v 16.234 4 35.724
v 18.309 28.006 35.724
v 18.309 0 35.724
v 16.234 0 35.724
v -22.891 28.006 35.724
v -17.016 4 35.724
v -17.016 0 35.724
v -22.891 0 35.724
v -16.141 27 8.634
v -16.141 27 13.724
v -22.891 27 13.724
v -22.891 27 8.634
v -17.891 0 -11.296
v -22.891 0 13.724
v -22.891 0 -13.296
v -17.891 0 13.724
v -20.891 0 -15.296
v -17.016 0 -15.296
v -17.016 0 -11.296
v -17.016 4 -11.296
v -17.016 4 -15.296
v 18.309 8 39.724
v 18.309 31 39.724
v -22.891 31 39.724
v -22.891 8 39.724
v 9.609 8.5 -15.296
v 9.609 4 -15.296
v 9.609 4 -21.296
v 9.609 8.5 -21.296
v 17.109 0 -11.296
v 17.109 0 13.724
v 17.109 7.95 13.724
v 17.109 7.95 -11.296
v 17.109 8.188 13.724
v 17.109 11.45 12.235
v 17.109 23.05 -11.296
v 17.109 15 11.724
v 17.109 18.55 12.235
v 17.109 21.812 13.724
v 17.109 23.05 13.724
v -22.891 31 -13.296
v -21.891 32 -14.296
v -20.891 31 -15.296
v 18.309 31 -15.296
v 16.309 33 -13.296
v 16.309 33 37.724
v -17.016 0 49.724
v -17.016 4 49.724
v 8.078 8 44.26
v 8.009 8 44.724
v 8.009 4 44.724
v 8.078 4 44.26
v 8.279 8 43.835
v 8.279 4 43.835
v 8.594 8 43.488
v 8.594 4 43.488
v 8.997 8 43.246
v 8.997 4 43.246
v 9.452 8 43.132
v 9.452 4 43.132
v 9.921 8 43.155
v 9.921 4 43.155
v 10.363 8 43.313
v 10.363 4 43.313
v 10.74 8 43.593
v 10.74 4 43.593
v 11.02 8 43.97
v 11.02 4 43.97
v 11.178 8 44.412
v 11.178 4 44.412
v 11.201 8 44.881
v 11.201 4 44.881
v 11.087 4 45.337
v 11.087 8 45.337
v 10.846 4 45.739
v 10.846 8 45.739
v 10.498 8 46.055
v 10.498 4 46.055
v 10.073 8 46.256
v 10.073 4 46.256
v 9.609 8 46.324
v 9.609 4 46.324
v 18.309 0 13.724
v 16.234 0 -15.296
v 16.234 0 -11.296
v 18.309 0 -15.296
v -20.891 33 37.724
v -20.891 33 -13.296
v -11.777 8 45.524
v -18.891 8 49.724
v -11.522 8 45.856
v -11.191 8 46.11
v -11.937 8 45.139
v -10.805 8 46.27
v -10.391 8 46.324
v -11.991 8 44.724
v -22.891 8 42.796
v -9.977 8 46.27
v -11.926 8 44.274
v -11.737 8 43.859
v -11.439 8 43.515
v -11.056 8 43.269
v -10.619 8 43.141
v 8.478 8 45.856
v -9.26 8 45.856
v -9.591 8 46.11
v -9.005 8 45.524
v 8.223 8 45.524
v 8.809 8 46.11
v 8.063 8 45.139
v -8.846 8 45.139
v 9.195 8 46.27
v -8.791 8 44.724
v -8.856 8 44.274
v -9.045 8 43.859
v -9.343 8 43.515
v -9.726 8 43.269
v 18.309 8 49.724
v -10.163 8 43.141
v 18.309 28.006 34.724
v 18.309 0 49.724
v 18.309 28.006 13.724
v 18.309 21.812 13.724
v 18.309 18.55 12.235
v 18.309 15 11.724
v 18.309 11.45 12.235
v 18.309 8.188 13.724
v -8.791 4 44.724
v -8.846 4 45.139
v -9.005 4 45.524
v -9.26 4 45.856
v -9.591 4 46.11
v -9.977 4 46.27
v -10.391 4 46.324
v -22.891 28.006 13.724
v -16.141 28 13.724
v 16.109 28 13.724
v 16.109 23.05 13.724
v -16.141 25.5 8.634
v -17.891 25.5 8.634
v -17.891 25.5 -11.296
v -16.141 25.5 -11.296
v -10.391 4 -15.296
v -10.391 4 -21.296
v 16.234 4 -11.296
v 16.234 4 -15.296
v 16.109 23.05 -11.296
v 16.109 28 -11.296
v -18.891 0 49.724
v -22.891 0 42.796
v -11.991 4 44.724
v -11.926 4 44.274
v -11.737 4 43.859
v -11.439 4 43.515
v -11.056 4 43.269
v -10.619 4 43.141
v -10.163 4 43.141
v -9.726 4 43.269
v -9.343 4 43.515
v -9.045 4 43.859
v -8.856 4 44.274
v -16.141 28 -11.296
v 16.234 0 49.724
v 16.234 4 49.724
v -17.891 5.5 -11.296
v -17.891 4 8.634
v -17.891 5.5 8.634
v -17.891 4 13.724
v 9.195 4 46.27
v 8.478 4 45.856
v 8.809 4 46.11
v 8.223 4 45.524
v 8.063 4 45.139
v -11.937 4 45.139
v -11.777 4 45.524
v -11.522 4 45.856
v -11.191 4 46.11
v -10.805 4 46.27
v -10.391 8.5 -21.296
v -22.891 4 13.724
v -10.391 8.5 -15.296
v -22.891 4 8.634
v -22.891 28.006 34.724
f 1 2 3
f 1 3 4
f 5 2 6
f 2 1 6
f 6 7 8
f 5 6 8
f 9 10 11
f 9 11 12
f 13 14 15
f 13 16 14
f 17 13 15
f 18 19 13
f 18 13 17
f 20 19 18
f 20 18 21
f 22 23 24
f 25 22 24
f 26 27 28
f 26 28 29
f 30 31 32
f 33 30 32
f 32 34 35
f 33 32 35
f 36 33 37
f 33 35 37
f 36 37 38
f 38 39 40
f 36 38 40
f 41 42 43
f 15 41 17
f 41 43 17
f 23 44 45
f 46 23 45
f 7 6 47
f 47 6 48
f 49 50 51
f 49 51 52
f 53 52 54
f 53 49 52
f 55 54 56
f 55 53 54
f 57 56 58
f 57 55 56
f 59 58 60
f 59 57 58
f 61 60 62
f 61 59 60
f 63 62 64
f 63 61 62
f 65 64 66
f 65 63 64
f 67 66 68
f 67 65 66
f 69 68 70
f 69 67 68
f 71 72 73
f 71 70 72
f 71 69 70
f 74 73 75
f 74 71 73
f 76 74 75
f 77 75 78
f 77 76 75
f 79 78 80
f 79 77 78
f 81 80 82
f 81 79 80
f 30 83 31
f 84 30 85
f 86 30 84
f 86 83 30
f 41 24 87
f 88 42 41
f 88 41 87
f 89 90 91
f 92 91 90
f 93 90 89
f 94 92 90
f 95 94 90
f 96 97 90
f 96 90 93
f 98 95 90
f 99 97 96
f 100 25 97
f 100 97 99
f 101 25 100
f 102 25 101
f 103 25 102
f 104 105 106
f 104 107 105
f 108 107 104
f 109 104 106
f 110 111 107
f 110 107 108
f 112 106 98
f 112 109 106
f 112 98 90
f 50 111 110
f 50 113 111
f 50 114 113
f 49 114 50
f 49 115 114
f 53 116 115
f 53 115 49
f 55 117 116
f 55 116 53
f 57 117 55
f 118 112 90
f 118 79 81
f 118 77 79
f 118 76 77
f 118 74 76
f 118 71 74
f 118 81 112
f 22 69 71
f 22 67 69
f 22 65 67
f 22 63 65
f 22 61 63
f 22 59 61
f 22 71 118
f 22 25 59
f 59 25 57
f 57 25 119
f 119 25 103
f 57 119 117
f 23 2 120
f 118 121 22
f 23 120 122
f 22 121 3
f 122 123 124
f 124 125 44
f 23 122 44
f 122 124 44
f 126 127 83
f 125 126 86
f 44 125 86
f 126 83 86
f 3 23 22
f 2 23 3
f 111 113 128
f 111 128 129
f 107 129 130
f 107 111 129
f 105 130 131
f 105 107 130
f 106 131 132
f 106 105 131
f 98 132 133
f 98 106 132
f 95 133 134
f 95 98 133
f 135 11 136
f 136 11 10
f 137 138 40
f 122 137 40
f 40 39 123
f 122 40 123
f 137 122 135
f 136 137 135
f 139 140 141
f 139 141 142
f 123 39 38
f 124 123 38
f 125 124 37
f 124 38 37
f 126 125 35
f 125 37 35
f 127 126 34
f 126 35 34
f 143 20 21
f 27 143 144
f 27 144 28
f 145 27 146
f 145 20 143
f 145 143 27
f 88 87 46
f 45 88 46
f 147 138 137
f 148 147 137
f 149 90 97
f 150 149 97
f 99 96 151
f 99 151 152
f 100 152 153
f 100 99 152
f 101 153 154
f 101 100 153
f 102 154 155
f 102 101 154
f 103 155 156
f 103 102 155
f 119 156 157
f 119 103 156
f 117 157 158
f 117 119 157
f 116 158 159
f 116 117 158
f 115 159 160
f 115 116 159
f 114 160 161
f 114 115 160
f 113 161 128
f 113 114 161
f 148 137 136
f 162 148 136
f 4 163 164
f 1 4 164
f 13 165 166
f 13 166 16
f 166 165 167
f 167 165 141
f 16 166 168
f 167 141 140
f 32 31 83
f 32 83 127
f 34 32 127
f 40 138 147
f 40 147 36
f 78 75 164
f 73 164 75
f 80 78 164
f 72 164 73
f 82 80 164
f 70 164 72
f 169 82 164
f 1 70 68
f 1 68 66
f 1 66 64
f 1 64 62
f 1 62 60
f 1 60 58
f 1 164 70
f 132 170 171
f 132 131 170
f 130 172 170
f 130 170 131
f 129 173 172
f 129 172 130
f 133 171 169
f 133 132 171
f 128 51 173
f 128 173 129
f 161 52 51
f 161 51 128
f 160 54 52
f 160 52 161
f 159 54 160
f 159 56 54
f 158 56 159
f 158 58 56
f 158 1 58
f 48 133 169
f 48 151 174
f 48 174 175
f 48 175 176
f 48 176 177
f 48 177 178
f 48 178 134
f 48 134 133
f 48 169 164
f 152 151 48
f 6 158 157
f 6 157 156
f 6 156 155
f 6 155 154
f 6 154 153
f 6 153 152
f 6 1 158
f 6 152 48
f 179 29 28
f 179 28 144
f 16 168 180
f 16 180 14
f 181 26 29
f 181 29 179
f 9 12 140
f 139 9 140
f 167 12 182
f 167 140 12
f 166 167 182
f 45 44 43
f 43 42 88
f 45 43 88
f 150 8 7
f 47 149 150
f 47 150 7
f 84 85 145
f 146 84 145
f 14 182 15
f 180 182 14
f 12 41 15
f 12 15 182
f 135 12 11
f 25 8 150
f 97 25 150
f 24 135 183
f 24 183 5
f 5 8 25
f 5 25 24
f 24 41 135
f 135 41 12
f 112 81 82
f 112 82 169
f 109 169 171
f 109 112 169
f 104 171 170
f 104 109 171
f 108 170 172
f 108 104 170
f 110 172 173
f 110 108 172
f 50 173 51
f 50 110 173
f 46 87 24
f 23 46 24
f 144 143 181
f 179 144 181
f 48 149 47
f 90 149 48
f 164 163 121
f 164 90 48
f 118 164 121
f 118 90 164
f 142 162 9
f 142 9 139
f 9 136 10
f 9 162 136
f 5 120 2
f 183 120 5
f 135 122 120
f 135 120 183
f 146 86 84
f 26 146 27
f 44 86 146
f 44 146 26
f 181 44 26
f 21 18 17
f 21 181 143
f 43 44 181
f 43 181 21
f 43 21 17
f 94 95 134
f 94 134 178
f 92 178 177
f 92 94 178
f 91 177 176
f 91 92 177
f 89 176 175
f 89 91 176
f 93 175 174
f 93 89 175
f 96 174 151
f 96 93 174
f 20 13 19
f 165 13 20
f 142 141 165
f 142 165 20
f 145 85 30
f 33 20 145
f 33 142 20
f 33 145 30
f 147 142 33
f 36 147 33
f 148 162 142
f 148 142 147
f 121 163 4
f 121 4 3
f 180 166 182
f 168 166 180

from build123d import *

# Parameters (mm, degrees)
SKETCH1_W                = 39
SKETCH1_H                = 49.22
BOSS_EXTRUDE2_DEPTH      = 30
SKETCH3_W                = 1.75
SKETCH3_H                = 20
SKETCH3_W_2              = 1
SKETCH3_H_2              = 15.1
CUT_EXTRUDE3_DEPTH       = 47.22
CUT_EXTRUDE4_DEPTH       = 47.22
CUT_EXTRUDE5_DEPTH       = 3.75
SKETCH9_W                = 22.2
SKETCH9_H                = 30
CUT_EXTRUDE7_DEPTH       = 61.922592565
SKETCH11_W               = 0.8
SKETCH11_H               = 21.811754546
SKETCH11_H_2             = 8.188245454
CUT_EXTRUDE8_DEPTH       = 46.008146799
SKETCH12_W               = 23
SKETCH12_H               = 2.5
BOSS_EXTRUDE3_DEPTH      = 3
SKETCH13_W               = 23
SKETCH13_H               = 2.5
BOSS_EXTRUDE4_DEPTH      = 3
BOSS_EXTRUDE5_REACH      = 51.909
SKETCH14_W               = 27.02
SKETCH14_H               = 3
SKETCH15_W               = 30.25
SKETCH15_H               = 3
CUT_EXTRUDE9_DEPTH       = 25.02
SKETCH16_W               = 30.25
SKETCH16_H               = 3
CUT_EXTRUDE10_DEPTH      = 46.276919382
SKETCH24_W               = 23
SKETCH24_H               = 2.5
BOSS_EXTRUDE8_DEPTH      = 6
BOSS_EXTRUDE9_DEPTH      = 3
SKETCH26_W               = 41.2
SKETCH26_H               = 27.02
BOSS_EXTRUDE10_DEPTH     = 3
SKETCH29_W               = 4.264424859
SKETCH29_H               = 26.447816837
CUT_EXTRUDE14_DEPTH      = 41.905994632
SKETCH30_W               = 3.981396999
SKETCH30_H               = 33.655588154
CUT_EXTRUDE15_DEPTH      = 40.425282457
BOSS_EXTRUDE15_DEPTH     = 2
BOSS_EXTRUDE16_DEPTH     = 2
SKETCH36_W               = 41.2
SKETCH36_H               = 4.993514727
BOSS_EXTRUDE17_DEPTH     = 26
SKETCH37_W               = 41.2
SKETCH37_H               = 5
BOSS_EXTRUDE18_DEPTH     = 28.006485273
SKETCH38_W               = 41.2
SKETCH38_H               = 5
BOSS_EXTRUDE19_DEPTH     = 20
BOSS_EXTRUDE21_DEPTH     = 5
SKETCH40_R               = 2
CUT_EXTRUDE16_DEPTH      = 78.060934741
BOSS_EXTRUDE22_DEPTH     = 10
SKETCH42_W               = 33.25
SKETCH42_H               = 4
CUT_EXTRUDE17_DEPTH      = 89.632791503
SKETCH43_W               = 30
SKETCH43_H               = 5
CUT_EXTRUDE19_DEPTH      = 10
SKETCH44_W               = 20
SKETCH44_H               = 4.5
BOSS_EXTRUDE23_DEPTH     = 6
SKETCH45_W               = 41.2
SKETCH45_H               = 15
CUT_EXTRUDE20_DEPTH      = 3
SKETCH46_W               = 41.2
SKETCH46_H               = 16.207061994
CUT_EXTRUDE21_DEPTH      = 80.015110347
SKETCH47_W               = 41.2
SKETCH47_H               = 10
BOSS_EXTRUDE24_DEPTH     = 3
SKETCH48_W               = 6
SKETCH48_H               = 25
SKETCH48_W_2             = 3
CUT_EXTRUDE22_DEPTH      = 66.095752287
SKETCH50_W               = 33.25
SKETCH50_H               = 1
CUT_EXTRUDE23_DEPTH      = 69.929234935
SKETCH51_W               = 5.875
SKETCH51_H               = 15
SKETCH51_W_2             = 2.075
BOSS_EXTRUDE25_DEPTH     = 3
CUT_EXTRUDE24_DEPTH      = 10
CUT_EXTRUDE24_DEPTH_BACK = 62.947676833
SKETCH54_W               = 41.2
SKETCH54_H               = 1
CUT_EXTRUDE25_DEPTH      = 28.006485273
CHAMFER1_SIZE            = 2
CUT_EXTRUDE28_DEPTH      = 61.179021802


with BuildPart() as part:
    # Sketch1 → Boss-Extrude2 (new body)
    with BuildSketch(Plane(origin=(0, 0, 0), x_dir=(1, 0, 0), z_dir=(0, 1, 0))):
        with Locations((-0.391025069, -11.314396792)):
            Rectangle(SKETCH1_W, SKETCH1_H)
    extrude(amount=BOSS_EXTRUDE2_DEPTH)

    # Sketch3 → Cut-Extrude3 (cut)
    with BuildSketch(Plane.XY.offset(35.924396792)):
        Polygon((16.108974931, 23.05), (16.108974931, 28), (-16.141025069, 28), (-16.141025069, 25.5), (-16.141025069, 5.5), (-16.141025069, 0), (16.108974931, 0), (16.108974931, 7.95), align=None)
        with Locations((-17.016025069, 15.5)):
            Rectangle(SKETCH3_W, SKETCH3_H)
        with Locations((16.608974931, 15.5)):
            Rectangle(SKETCH3_W_2, SKETCH3_H_2)
    extrude(amount=-CUT_EXTRUDE3_DEPTH, mode=Mode.SUBTRACT)

    # Sketch7 → Cut-Extrude4 (cut)
    with BuildSketch(Plane.ZY.offset(19.891025069)):
        with BuildLine():
            ThreePointArc((11.724396792, 15), (24.324396792, 2.4), (36.924396792, 15))
            ThreePointArc((36.924396792, 15), (24.324396792, 27.6), (11.724396792, 15))
        make_face()
    extrude(amount=-CUT_EXTRUDE4_DEPTH, mode=Mode.SUBTRACT)

    # Sketch8 → Cut-Extrude5 (cut)
    with BuildSketch(Plane.ZY.offset(19.891025069)):
        with BuildLine():
            Line((35.924396792, 30), (17.633933867, 30))
            Line((17.633933867, 30), (17.633933867, 27))
            Line((17.633933867, 27), (8.633933867, 27))
            Line((8.633933867, 27), (8.633933867, 4))
            Line((8.633933867, 4), (17.633933867, 4))
            Line((17.633933867, 4), (17.633933867, 0))
            Line((17.633933867, 0), (35.924396792, 0))
            Line((35.924396792, 0), (35.924396792, 10.08065045))
            ThreePointArc((35.924396792, 10.08065045), (11.724396792, 15), (35.924396792, 19.91934955))
            Line((35.924396792, 19.91934955), (35.924396792, 30))
        make_face()
    extrude(amount=-CUT_EXTRUDE5_DEPTH, mode=Mode.SUBTRACT)

    # Sketch9 → Cut-Extrude7 (cut, through all)
    with BuildSketch(Plane(origin=(19.108974931, 0, 0), x_dir=(0, 0, -1), z_dir=(1, 0, 0))):
        with Locations((-24.824396792, 15)):
            Rectangle(SKETCH9_W, SKETCH9_H)
    extrude(amount=-CUT_EXTRUDE7_DEPTH, mode=Mode.SUBTRACT)

    # Sketch11 → Cut-Extrude8 (cut, through all)
    with BuildSketch(Plane.XY.offset(13.724396792)):
        with Locations((18.708974931, 19.094122727)):
            Rectangle(SKETCH11_W, SKETCH11_H)
        with Locations((18.708974931, 4.094122727)):
            Rectangle(SKETCH11_W, SKETCH11_H_2)
    extrude(amount=-CUT_EXTRUDE8_DEPTH, mode=Mode.SUBTRACT)

    # Sketch12 → Boss-Extrude3 (add)
    with BuildSketch(Plane(origin=(18.308974931, 0, 0), x_dir=(0, 0, -1), z_dir=(1, 0, 0))):
        with Locations((1.795603208, 1.25)):
            Rectangle(SKETCH12_W, SKETCH12_H)
    extrude(amount=BOSS_EXTRUDE3_DEPTH)

    # Sketch13 → Boss-Extrude4 (add)
    with BuildSketch(Plane.ZY.offset(19.891025069)):
        with Locations((-1.795603208, 1.25)):
            Rectangle(SKETCH13_W, SKETCH13_H)
    extrude(amount=BOSS_EXTRUDE4_DEPTH)

    # Sketch14 → Boss-Extrude5 (add, up to next)
    with BuildSketch(Plane(origin=(-16.141025069, 0, 0), x_dir=(0, 0, -1), z_dir=(1, 0, 0)), mode=Mode.PRIVATE) as boss_extrude5_sk1:
        with Locations((-0.214396792, 1.5)):
            Rectangle(SKETCH14_W, SKETCH14_H)
    boss_extrude5_tool1 = extrude(boss_extrude5_sk1.sketch, amount=BOSS_EXTRUDE5_REACH, mode=Mode.PRIVATE) - part.part
    add(boss_extrude5_tool1.solids().sort_by_distance((-16.141025, 1.5, 0.214397))[0])

    # Sketch15 → Cut-Extrude9 (cut)
    with BuildSketch(Plane.XY.offset(13.724396792)):
        with Locations((-0.016025069, 1.5)):
            Rectangle(SKETCH15_W, SKETCH15_H)
    extrude(amount=-CUT_EXTRUDE9_DEPTH, mode=Mode.SUBTRACT)

    # Sketch16 → Cut-Extrude10 (cut, through all)
    with BuildSketch(Plane.XY.offset(-11.295603208)):
        with Locations((-0.016025069, 1.5)):
            Rectangle(SKETCH16_W, SKETCH16_H)
    extrude(amount=-CUT_EXTRUDE10_DEPTH, mode=Mode.SUBTRACT)

    # Sketch24 → Boss-Extrude8 (add)
    with BuildSketch(Plane.ZY.offset(22.891025069)):
        with Locations((-1.795603208, 1.25)):
            Rectangle(SKETCH24_W, SKETCH24_H)
    extrude(amount=BOSS_EXTRUDE8_DEPTH)

    # Sketch25 → Boss-Extrude9 (add)
    with BuildSketch(Plane.ZY.offset(19.891025069)):
        Polygon((-13.295603208, 30), (13.724396792, 30), (13.724396792, 27), (8.633933867, 27), (8.633933867, 4), (13.724396792, 4), (13.724396792, 0), (9.704396792, 0), (9.704396792, 2.5), (-13.295603208, 2.5), align=None)
    extrude(amount=BOSS_EXTRUDE9_DEPTH)

    # Sketch26 → Boss-Extrude10 (add)
    with BuildSketch(Plane(origin=(0, 30, 0), x_dir=(1, 0, 0), z_dir=(0, 1, 0))):
        with Locations((-2.291025069, -0.214396792)):
            Rectangle(SKETCH26_W, SKETCH26_H)
    extrude(amount=BOSS_EXTRUDE10_DEPTH)

    # Sketch29 → Cut-Extrude14 (cut, through all)
    with BuildSketch(Plane.XZ.offset(-25.5)):
        with Locations((-15.75881264, 1.92830521)):
            Rectangle(SKETCH29_W, SKETCH29_H)
    extrude(amount=CUT_EXTRUDE14_DEPTH, mode=Mode.SUBTRACT)

    # Sketch30 → Cut-Extrude15 (cut, through all)
    with BuildSketch(Plane(origin=(0, 23.05, 0), x_dir=(-1, 0, 0), z_dir=(0, -1, 0))):
        with Locations((-15.118276432, -5.532190869)):
            Rectangle(SKETCH30_W, SKETCH30_H)
    extrude(amount=CUT_EXTRUDE15_DEPTH, mode=Mode.SUBTRACT)

    # Sketch34 → Boss-Extrude15 (add)
    with BuildSketch(Plane(origin=(0, 0, -13.295603208), x_dir=(-1, 0, 0), z_dir=(0, 0, -1))):
        Polygon((-18.308974931, 33), (-18.308974931, 2.5), (-21.308974931, 2.5), (-21.308974931, 0), (28.891025069, 0), (28.891025069, 2.5), (22.891025069, 2.5), (22.891025069, 33), align=None)
    extrude(amount=-BOSS_EXTRUDE15_DEPTH)

    # Sketch35 → Boss-Extrude16 (add)
    with BuildSketch(Plane(origin=(0, 0, -13.295603208), x_dir=(-1, 0, 0), z_dir=(0, 0, -1))):
        Polygon((-18.308974931, 33), (-18.308974931, 2.5), (-21.308974931, 2.5), (-21.308974931, 0), (28.891025069, 0), (28.891025069, 2.5), (22.891025069, 2.5), (22.891025069, 33), align=None)
    extrude(amount=BOSS_EXTRUDE16_DEPTH)

    # Sketch36 → Boss-Extrude17 (add)
    with BuildSketch(Plane.XY.offset(13.724396792)):
        with Locations((-2.291025069, 30.503242637)):
            Rectangle(SKETCH36_W, SKETCH36_H)
    extrude(amount=BOSS_EXTRUDE17_DEPTH)

    # Sketch37 → Boss-Extrude18 (add)
    with BuildSketch(Plane(origin=(0, 28.006485273, 0), x_dir=(-1, 0, 0), z_dir=(0, -1, 0))):
        with Locations((2.291025069, -37.224396792)):
            Rectangle(SKETCH37_W, SKETCH37_H)
    extrude(amount=BOSS_EXTRUDE18_DEPTH)

    # Sketch38 → Boss-Extrude19 (add)
    with BuildSketch(Plane.XY.offset(39.724396792)):
        with Locations((-2.291025069, 2.5)):
            Rectangle(SKETCH38_W, SKETCH38_H)
    extrude(amount=BOSS_EXTRUDE19_DEPTH)

    # Sketch39 → Boss-Extrude21 (add)
    with BuildSketch(Plane(origin=(0, 5, 0), x_dir=(1, 0, 0), z_dir=(0, 1, 0))):
        with BuildLine():
            Line((-8.291025069, -59.724396792), (-22.891025069, -59.724396792))
            Line((-22.891025069, -59.724396792), (-4.038597885, -65.464256481))
            ThreePointArc((-4.038597885, -65.464256481), (-7.112095329, -63.296130482), (-8.291025069, -59.724396792))
        make_face()
        with BuildLine():
            ThreePointArc((-8.291025069, -59.724396792), (-7.112095329, -63.296130482), (-4.038597885, -65.464256481))
            ThreePointArc((-4.038597885, -65.464256481), (-2.291025069, -65.724396792), (-0.543452254, -65.464256481))
            ThreePointArc((-0.543452254, -65.464256481), (2.53004519, -63.296130482), (3.708974931, -59.724396792))
            Line((3.708974931, -59.724396792), (-0.291025069, -59.724396792))
            ThreePointArc((-0.291025069, -59.724396792), (-2.291025069, -61.724396792), (-4.291025069, -59.724396792))
            Line((-4.291025069, -59.724396792), (-8.291025069, -59.724396792))
        make_face()
        with BuildLine():
            ThreePointArc((3.708974931, -59.724396792), (-2.291025069, -53.724396792), (-8.291025069, -59.724396792))
            Line((-8.291025069, -59.724396792), (-4.291025069, -59.724396792))
            ThreePointArc((-4.291025069, -59.724396792), (-2.291025069, -57.724396792), (-0.291025069, -59.724396792))
            Line((-0.291025069, -59.724396792), (3.708974931, -59.724396792))
        make_face()
        with BuildLine():
            ThreePointArc((3.708974931, -59.724396792), (2.53004519, -63.296130482), (-0.543452254, -65.464256481))
            Line((-0.543452254, -65.464256481), (18.308974931, -59.724396792))
            Line((18.308974931, -59.724396792), (3.708974931, -59.724396792))
        make_face()
    extrude(amount=-BOSS_EXTRUDE21_DEPTH)

    # Sketch40 → Cut-Extrude16 (cut, through all)
    with BuildSketch(Plane(origin=(0, 5, 0), x_dir=(1, 0, 0), z_dir=(0, 1, 0))):
        with Locations(Location((-2.291025069, -59.724396792, 0), (0, 0, 270))):
            Circle(SKETCH40_R)
    extrude(amount=-CUT_EXTRUDE16_DEPTH, mode=Mode.SUBTRACT)

    # Fillet1
    # the kernel refuses this chamfer: 2 mm, written as the material it takes off along each edge
    with BuildSketch(Plane(origin=(-22.891025069, 33, -20.438969184), x_dir=(-0.027495876610585647, -0.9996219169112968, 0), z_dir=(0, 0, 1))) as fillet1_piece_1:
        with BuildLine():
            Line((2.05734639, 0), (-0.11309431, 2.054235587))
            Line((-0.11309431, 2.054235587), (-0.153079186, 2.053135752))
            ThreePointArc((-0.153079186, 2.053135752), (-0.068258454, 1.026795659), (-0.039984877, -0.001099835))
            Line((-0.039984877, -0.001099835), (0.001099835, -0.039984877))
            ThreePointArc((0.001099835, -0.039984877), (1.028995329, -0.011711299), (2.058446225, -0.039984877))
            Line((2.058446225, -0.039984877), (2.05734639, 0))
        make_face()
    extrude(amount=65.306731952, mode=Mode.SUBTRACT)
    with BuildSketch(Plane(origin=(18.308974931, 33, -20.438969184), x_dir=(0.027495876610585647, -0.9996219169112968, 0), z_dir=(0, 0, 1))) as fillet1_piece_2:
        with BuildLine():
            Line((2.05734639, 0), (-0.11309431, -2.054235587))
            Line((-0.11309431, -2.054235587), (-0.153079186, -2.053135752))
            ThreePointArc((-0.153079186, -2.053135752), (-0.068258454, -1.026795659), (-0.039984877, 0.001099835))
            Line((-0.039984877, 0.001099835), (0.001099835, 0.039984877))
            ThreePointArc((0.001099835, 0.039984877), (1.028995329, 0.011711299), (2.058446225, 0.039984877))
            Line((2.058446225, 0.039984877), (2.05734639, 0))
        make_face()
    extrude(amount=65.306731952, mode=Mode.SUBTRACT)
    with BuildSketch(Plane(origin=(-28.034391045, 33, -15.295603208), x_dir=(0, -0.9996219169112968, -0.02749587661058651), z_dir=(1, 0, 0)), Plane(origin=(-28.034391045, 33, 39.724396792), x_dir=(0, 0.027495876610585647, -0.9996219169112968), z_dir=(1, 0, 0))) as fillet1_piece_3:
        with BuildLine():
            Line((2.05734639, 0), (-0.11309431, -2.054235587))
            Line((-0.11309431, -2.054235587), (-0.153079186, -2.053135752))
            ThreePointArc((-0.153079186, -2.053135752), (-0.068258454, -1.026795659), (-0.039984877, 0.001099835))
            Line((-0.039984877, 0.001099835), (0.001099835, 0.039984877))
            ThreePointArc((0.001099835, 0.039984877), (1.028995329, 0.011711299), (2.058446225, 0.039984877))
            Line((2.058446225, 0.039984877), (2.05734639, 0))
        make_face()
    extrude(amount=51.486731952, mode=Mode.SUBTRACT)
    with BuildSketch(Plane(origin=(-22.891025069, 8.866831055, 59.724396792), x_dir=(-0.030789498682027062, 0, -0.9995258909957808), z_dir=(0, -1, 0)), Plane(origin=(18.308974931, -3.866831055, 59.724396792), x_dir=(0.030789498682027062, 0, -0.9995258909957808), z_dir=(0, 1, 0))) as fillet1_piece_4:
        with BuildLine():
            Line((1.546732422, 0), (-0.540723907, 1.449137275))
            Line((-0.540723907, 1.449137275), (-0.578612783, 1.436314131))
            ThreePointArc((-0.578612783, 1.436314131), (-0.285696, 0.719378969), (-0.037888877, -0.012823145))
            Line((-0.037888877, -0.012823145), (0.00123158, -0.039981036))
            ThreePointArc((0.00123158, -0.039981036), (0.773864645, -0.016180767), (1.547964002, -0.039981036))
            Line((1.547964002, -0.039981036), (1.546732422, 0))
        make_face()
    extrude(amount=12.73366211, mode=Mode.SUBTRACT)

    # Sketch41 → Boss-Extrude22 (add)
    with BuildSketch(Plane(origin=(0, 0, -15.295603208), x_dir=(-1, 0, 0), z_dir=(0, 0, -1))):
        Polygon((17.291025069, 5), (2.291025069, 5), (-12.708974931, 5), (-12.708974931, 0), (2.291025069, 0), (17.291025069, 0), align=None)
    extrude(amount=BOSS_EXTRUDE22_DEPTH)

    # Sketch42 → Cut-Extrude17 (cut, through all)
    with BuildSketch(Plane.XY.offset(-11.295603208)):
        with Locations((-0.391025069, 2)):
            Rectangle(SKETCH42_W, SKETCH42_H)
    extrude(amount=-CUT_EXTRUDE17_DEPTH, mode=Mode.SUBTRACT)

    # Sketch43 → Cut-Extrude19 (cut)
    with BuildSketch(Plane(origin=(0, 0, -25.295603208), x_dir=(-1, 0, 0), z_dir=(0, 0, -1))):
        with Locations((2.291025069, 2.5)):
            Rectangle(SKETCH43_W, SKETCH43_H)
    extrude(amount=-CUT_EXTRUDE19_DEPTH, mode=Mode.SUBTRACT)

    # Sketch44 → Boss-Extrude23 (add)
    with BuildSketch(Plane(origin=(0, 0, -15.295603208), x_dir=(-1, 0, 0), z_dir=(0, 0, -1))):
        with Locations((0.391025069, 6.25)):
            Rectangle(SKETCH44_W, SKETCH44_H)
    extrude(amount=BOSS_EXTRUDE23_DEPTH)

    # Sketch45 → Cut-Extrude20 (cut)
    with BuildSketch(Plane(origin=(0, 0, 0), x_dir=(-1, 0, 0), z_dir=(0, -1, 0))):
        with Locations((2.291025069, -42.224396792)):
            Rectangle(SKETCH45_W, SKETCH45_H)
    extrude(amount=-CUT_EXTRUDE20_DEPTH, mode=Mode.SUBTRACT)

    # Sketch46 → Cut-Extrude21 (cut, through all)
    with BuildSketch(Plane(origin=(0, 0, 0), x_dir=(-1, 0, 0), z_dir=(0, -1, 0))):
        with Locations((2.291025069, -57.827927789)):
            Rectangle(SKETCH46_W, SKETCH46_H)
    extrude(amount=-CUT_EXTRUDE21_DEPTH, mode=Mode.SUBTRACT)

    # Sketch47 → Boss-Extrude24 (add)
    with BuildSketch(Plane(origin=(0, 5, 0), x_dir=(1, 0, 0), z_dir=(0, 1, 0))):
        with Locations((-2.291025069, -44.724396792)):
            Rectangle(SKETCH47_W, SKETCH47_H)
    extrude(amount=BOSS_EXTRUDE24_DEPTH)

    # Sketch48 → Cut-Extrude22 (cut, through all)
    with BuildSketch(Plane(origin=(0, 2.5, 0), x_dir=(1, 0, 0), z_dir=(0, 1, 0))):
        with Locations((-25.891025069, 2.795603208)):
            Rectangle(SKETCH48_W, SKETCH48_H)
        with Locations((19.808974931, 2.795603208)):
            Rectangle(SKETCH48_W_2, SKETCH48_H)
    extrude(amount=-CUT_EXTRUDE22_DEPTH, mode=Mode.SUBTRACT)

    # Sketch50 → Cut-Extrude23 (cut, through all)
    with BuildSketch(Plane(origin=(0, 0, 34.724396792), x_dir=(-1, 0, 0), z_dir=(0, 0, -1))):
        with Locations((0.391025069, 3.5)):
            Rectangle(SKETCH50_W, SKETCH50_H)
    extrude(amount=-CUT_EXTRUDE23_DEPTH, mode=Mode.SUBTRACT)

    # Sketch51 → Boss-Extrude25 (add)
    with BuildSketch(Plane.XZ.offset(-3)):
        with Locations((-19.953525069, 42.224396792)):
            Rectangle(SKETCH51_W, SKETCH51_H)
        with Locations((17.271474931, 42.224396792)):
            Rectangle(SKETCH51_W_2, SKETCH51_H)
    extrude(amount=BOSS_EXTRUDE25_DEPTH)

    # Sketch52 → Cut-Extrude24 (cut, two sides: drawn at the far end of the back side and taken through both)
    with BuildSketch(Plane(origin=(0, 4, 0), x_dir=(-1, 0, 0), z_dir=(0, -1, 0)).offset(-CUT_EXTRUDE24_DEPTH_BACK)):
        with BuildLine():
            ThreePointArc((8.791025069, -44.724396792), (9.259654219, -45.855767642), (10.391025069, -46.324396792))
            Line((10.391025069, -46.324396792), (10.391025069, -44.724396792))
            Line((10.391025069, -44.724396792), (8.791025069, -44.724396792))
        make_face()
        with BuildLine():
            Line((10.391025069, -44.724396792), (10.391025069, -46.324396792))
            ThreePointArc((10.391025069, -46.324396792), (11.522395919, -45.855767642), (11.991025069, -44.724396792))
            ThreePointArc((11.991025069, -44.724396792), (10.391025069, -43.124396792), (8.791025069, -44.724396792))
            Line((8.791025069, -44.724396792), (10.391025069, -44.724396792))
        make_face()
        with BuildLine():
            ThreePointArc((-8.008974931, -44.724396792), (-10.740345781, -43.593025942), (-9.608974931, -46.324396792))
            Line((-9.608974931, -46.324396792), (-9.608974931, -44.724396792))
            Line((-9.608974931, -44.724396792), (-8.008974931, -44.724396792))
        make_face()
        with BuildLine():
            Line((-9.608974931, -44.724396792), (-9.608974931, -46.324396792))
            ThreePointArc((-9.608974931, -46.324396792), (-8.477604081, -45.855767642), (-8.008974931, -44.724396792))
            Line((-8.008974931, -44.724396792), (-9.608974931, -44.724396792))
        make_face()
    extrude(amount=CUT_EXTRUDE24_DEPTH + CUT_EXTRUDE24_DEPTH_BACK, mode=Mode.SUBTRACT)

    # Sketch54 → Cut-Extrude25 (cut)
    with BuildSketch(Plane(origin=(0, 0, 0), x_dir=(-1, 0, 0), z_dir=(0, -1, 0))):
        with Locations((2.291025069, -35.224396792)):
            Rectangle(SKETCH54_W, SKETCH54_H)
    extrude(amount=-CUT_EXTRUDE25_DEPTH, mode=Mode.SUBTRACT)

    # Chamfer1
    chamfer1_edges = [part.edges().sort_by_distance(p)[0] for p in [
        (-22.891025069, 15.5, -15.295603208),
    ]]
    chamfer(chamfer1_edges, length=CHAMFER1_SIZE)

    # Sketch55 → Cut-Extrude28 (cut, through all)
    with BuildSketch(Plane(origin=(0, 8, 0), x_dir=(1, 0, 0), z_dir=(0, 1, 0))):
        Polygon((-22.891025069, -42.796193562), (-22.891025069, -49.724396792), (-18.891025069, -49.724396792), align=None)
    extrude(amount=-CUT_EXTRUDE28_DEPTH, mode=Mode.SUBTRACT)


solid = part.part
